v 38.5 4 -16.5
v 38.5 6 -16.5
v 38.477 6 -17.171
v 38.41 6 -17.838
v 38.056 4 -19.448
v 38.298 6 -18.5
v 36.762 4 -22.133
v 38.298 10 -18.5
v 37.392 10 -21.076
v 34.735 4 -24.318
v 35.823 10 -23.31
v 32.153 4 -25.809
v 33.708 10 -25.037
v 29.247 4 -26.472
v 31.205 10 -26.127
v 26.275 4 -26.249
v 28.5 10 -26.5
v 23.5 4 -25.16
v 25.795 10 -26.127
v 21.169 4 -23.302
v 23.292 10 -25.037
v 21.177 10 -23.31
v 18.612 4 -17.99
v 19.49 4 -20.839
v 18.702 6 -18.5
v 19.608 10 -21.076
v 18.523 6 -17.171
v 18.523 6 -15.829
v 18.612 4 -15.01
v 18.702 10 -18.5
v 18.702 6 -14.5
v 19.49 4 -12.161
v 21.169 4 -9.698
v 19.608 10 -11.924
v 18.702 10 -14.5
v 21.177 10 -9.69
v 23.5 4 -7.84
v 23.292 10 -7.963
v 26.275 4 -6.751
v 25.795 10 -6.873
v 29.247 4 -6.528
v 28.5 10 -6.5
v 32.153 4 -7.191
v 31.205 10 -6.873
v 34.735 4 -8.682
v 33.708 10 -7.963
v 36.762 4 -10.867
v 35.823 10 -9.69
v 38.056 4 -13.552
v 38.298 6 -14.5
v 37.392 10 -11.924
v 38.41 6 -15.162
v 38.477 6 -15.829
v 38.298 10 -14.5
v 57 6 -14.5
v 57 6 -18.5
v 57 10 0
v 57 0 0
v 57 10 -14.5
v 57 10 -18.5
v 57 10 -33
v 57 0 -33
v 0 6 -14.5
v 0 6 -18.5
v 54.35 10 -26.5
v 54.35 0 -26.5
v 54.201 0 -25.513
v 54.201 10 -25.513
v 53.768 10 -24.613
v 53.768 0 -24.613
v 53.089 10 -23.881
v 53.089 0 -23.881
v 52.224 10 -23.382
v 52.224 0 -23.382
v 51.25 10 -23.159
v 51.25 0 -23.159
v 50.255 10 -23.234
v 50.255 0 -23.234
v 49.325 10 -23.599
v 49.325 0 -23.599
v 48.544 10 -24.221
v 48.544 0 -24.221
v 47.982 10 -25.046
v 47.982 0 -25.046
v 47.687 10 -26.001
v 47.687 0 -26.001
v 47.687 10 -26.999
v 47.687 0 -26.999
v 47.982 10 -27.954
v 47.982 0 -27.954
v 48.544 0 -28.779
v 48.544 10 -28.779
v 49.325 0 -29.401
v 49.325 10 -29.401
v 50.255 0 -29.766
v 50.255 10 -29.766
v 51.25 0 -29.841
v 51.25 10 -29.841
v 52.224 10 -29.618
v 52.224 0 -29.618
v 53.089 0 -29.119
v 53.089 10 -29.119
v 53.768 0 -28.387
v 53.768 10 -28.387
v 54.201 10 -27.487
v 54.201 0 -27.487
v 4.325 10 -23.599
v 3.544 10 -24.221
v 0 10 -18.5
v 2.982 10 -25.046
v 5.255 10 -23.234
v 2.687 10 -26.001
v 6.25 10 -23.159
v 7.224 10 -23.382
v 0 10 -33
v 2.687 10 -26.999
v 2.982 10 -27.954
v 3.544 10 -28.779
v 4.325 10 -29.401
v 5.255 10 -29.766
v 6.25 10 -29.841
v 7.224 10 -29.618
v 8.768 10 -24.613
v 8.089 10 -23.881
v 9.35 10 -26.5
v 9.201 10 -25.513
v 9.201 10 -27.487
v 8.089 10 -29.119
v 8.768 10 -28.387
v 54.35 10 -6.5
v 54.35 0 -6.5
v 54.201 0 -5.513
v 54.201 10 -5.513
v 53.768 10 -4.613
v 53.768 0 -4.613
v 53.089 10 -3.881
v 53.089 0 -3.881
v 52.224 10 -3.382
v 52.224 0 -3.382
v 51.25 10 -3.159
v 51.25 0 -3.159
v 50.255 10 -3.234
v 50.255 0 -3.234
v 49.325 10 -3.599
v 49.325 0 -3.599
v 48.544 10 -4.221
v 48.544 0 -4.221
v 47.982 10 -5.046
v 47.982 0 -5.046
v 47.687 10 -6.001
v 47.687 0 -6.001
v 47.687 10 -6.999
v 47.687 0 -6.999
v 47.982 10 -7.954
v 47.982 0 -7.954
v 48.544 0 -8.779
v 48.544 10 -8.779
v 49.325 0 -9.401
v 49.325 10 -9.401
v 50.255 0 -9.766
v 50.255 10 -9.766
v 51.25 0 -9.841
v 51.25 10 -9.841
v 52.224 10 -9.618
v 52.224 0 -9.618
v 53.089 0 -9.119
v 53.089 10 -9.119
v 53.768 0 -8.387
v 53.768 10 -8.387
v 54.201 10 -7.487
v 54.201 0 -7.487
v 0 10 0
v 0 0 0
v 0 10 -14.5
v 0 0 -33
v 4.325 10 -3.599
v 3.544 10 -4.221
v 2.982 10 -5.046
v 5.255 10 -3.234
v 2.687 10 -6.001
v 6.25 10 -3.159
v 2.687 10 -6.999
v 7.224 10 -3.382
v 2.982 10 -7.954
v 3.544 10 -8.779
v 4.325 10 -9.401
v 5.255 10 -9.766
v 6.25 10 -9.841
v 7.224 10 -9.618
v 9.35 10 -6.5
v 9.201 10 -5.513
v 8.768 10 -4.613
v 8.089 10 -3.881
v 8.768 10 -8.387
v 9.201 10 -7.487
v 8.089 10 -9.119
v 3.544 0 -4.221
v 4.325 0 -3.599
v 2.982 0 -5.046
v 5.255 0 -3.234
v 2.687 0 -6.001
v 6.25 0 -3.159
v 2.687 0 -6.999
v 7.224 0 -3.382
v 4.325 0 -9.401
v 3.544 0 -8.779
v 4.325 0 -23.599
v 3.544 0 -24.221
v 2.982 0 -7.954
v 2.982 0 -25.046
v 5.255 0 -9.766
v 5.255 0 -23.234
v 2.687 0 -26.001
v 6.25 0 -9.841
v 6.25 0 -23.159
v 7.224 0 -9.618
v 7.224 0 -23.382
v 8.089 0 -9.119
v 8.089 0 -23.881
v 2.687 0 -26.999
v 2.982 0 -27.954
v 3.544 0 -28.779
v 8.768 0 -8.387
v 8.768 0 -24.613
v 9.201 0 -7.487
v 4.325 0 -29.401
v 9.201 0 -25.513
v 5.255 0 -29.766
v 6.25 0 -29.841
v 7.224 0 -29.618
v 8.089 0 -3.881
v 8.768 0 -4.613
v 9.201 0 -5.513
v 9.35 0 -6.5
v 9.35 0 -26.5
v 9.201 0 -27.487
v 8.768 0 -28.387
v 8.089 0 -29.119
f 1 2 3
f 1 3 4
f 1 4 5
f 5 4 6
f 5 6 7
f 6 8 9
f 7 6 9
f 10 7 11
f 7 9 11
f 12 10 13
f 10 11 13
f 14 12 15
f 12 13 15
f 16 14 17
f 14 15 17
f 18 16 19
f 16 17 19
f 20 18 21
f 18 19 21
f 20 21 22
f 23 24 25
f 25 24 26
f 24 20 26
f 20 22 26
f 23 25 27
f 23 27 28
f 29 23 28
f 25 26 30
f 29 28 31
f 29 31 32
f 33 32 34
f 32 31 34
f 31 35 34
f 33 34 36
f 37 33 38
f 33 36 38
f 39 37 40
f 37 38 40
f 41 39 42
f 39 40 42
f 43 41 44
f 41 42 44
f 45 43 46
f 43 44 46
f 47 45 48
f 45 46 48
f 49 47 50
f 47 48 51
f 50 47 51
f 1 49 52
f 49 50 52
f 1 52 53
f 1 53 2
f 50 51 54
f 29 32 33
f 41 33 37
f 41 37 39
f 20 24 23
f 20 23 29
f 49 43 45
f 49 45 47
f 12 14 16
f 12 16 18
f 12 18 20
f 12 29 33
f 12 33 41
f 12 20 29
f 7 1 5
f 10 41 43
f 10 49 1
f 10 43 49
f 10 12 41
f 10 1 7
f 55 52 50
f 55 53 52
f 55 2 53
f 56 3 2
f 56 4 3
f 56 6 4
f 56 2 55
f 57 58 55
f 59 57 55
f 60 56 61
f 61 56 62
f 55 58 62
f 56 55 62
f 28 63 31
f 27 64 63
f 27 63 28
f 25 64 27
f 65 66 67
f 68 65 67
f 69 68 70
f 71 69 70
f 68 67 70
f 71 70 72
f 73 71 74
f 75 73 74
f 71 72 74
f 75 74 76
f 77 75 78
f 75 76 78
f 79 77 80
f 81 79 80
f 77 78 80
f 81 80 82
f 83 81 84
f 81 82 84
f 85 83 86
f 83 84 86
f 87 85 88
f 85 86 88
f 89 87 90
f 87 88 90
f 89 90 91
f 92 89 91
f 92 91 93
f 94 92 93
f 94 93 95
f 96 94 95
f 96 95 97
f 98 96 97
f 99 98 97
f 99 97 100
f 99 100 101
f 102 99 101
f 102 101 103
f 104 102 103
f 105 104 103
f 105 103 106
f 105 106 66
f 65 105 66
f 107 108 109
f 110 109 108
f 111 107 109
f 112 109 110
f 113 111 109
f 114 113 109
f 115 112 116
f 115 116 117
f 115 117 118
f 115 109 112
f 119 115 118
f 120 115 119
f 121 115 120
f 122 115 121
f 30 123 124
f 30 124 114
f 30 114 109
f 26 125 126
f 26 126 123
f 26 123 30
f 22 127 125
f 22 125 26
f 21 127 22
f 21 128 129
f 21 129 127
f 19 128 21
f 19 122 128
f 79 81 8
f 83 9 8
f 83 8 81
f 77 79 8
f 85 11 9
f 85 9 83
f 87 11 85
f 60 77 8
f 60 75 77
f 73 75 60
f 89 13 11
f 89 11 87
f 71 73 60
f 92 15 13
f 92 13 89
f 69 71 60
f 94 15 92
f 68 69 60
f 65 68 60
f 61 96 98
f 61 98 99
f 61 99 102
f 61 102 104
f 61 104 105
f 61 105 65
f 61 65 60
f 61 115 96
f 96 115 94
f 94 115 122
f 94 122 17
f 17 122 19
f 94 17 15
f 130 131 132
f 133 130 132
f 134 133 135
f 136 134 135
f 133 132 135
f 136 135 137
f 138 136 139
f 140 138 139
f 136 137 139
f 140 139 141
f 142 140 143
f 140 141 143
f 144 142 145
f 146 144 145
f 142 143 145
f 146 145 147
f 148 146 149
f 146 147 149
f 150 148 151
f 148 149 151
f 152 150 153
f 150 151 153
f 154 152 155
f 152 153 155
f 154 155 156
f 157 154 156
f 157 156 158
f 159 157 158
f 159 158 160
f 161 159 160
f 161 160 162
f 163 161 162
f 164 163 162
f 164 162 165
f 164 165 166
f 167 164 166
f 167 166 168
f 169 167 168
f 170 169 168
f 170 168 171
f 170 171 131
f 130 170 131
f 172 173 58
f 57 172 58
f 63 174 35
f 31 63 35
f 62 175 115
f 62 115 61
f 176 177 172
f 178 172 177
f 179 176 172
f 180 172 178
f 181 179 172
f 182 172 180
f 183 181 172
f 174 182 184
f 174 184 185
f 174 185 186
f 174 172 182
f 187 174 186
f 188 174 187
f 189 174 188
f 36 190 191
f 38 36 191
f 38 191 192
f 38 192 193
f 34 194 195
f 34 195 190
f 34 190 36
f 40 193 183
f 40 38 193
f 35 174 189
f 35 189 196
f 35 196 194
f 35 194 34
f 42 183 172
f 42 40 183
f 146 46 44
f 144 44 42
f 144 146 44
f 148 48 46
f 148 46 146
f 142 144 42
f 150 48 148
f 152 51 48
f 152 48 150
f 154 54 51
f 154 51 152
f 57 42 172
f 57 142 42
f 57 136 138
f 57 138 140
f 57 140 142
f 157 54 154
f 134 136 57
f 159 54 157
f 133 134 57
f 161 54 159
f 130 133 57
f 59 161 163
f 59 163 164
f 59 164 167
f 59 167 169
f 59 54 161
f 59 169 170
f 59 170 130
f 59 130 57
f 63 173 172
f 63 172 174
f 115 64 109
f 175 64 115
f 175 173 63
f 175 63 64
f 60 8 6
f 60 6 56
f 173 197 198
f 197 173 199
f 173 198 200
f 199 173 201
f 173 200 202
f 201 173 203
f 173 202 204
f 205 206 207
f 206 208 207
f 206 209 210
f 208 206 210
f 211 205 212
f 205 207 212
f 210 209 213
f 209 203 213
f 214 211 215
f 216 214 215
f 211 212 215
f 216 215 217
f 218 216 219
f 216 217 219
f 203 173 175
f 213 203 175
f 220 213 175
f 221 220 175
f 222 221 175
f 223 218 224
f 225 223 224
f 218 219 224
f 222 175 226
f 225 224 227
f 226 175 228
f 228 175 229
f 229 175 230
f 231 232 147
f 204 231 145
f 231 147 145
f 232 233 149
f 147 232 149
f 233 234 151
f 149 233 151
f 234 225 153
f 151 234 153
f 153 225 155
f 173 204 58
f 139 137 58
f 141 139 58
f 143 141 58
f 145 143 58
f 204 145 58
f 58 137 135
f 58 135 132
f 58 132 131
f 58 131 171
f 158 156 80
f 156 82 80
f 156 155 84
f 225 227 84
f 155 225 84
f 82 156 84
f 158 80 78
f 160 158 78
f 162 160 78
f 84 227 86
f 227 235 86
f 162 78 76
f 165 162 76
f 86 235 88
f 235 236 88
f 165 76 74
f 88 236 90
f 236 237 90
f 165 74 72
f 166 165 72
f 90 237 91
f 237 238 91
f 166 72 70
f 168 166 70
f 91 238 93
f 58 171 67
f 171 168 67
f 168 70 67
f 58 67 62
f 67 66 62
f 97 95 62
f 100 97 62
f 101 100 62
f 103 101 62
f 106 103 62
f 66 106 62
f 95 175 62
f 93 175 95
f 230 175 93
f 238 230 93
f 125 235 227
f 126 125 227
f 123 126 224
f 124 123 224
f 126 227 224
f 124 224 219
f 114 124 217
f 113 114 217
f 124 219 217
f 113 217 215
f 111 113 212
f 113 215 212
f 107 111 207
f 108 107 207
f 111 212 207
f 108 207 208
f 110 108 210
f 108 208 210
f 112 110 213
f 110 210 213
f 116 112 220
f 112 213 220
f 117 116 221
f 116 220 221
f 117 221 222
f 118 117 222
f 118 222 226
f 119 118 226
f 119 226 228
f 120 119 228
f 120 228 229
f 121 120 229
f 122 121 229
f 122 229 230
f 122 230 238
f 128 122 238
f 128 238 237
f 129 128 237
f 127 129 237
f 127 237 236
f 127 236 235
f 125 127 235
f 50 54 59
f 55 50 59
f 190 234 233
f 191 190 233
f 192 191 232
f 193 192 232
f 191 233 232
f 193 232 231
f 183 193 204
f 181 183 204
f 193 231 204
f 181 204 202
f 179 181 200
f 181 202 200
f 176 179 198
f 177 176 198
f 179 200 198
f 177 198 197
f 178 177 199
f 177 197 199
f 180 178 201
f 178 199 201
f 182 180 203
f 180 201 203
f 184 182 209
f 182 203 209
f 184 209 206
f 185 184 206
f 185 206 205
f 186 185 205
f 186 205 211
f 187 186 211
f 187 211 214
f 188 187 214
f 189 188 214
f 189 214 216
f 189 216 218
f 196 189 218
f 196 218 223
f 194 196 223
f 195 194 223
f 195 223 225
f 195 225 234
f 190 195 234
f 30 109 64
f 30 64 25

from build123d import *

# Parameters (mm, degrees)
SKETCH1_W           = 57
SKETCH1_H           = 33
BOSS_EXTRUDE1_DEPTH = 10
SKETCH3_R           = 3.35
CUT_EXTRUDE1_DEPTH  = 11
SKETCH4_R           = 3.35
CUT_EXTRUDE2_DEPTH  = 11
SKETCH10_R          = 3.35
CUT_EXTRUDE5_DEPTH  = 11
SKETCH12_R          = 3.35
CUT_EXTRUDE6_DEPTH  = 11
SKETCH16_W          = 57
SKETCH16_H          = 4
CUT_EXTRUDE7_DEPTH  = 4
SKETCH17_R          = 10
CUT_EXTRUDE8_DEPTH  = 6


with BuildPart() as part:
    # Sketch1 → Boss-Extrude1 (new body)
    with BuildSketch(Plane(origin=(0, 0, 0), x_dir=(1, 0, 0), z_dir=(0, 1, 0))):
        with Locations((28.5, 16.5)):
            Rectangle(SKETCH1_W, SKETCH1_H)
    extrude(amount=BOSS_EXTRUDE1_DEPTH)

    # Sketch3 → Cut-Extrude1 (cut, through all)
    with BuildSketch(Plane.XZ):
        with Locations((6, -6.5)):
            Circle(SKETCH3_R)
    extrude(amount=-CUT_EXTRUDE1_DEPTH, mode=Mode.SUBTRACT)

    # Sketch4 → Cut-Extrude2 (cut, through all)
    with BuildSketch(Plane.XZ):
        with Locations((51, -26.5)):
            Circle(SKETCH4_R)
    extrude(amount=-CUT_EXTRUDE2_DEPTH, mode=Mode.SUBTRACT)

    # Sketch10 → Cut-Extrude5 (cut, through all)
    with BuildSketch(Plane.XZ):
        with Locations((6, -26.5)):
            Circle(SKETCH10_R)
    extrude(amount=-CUT_EXTRUDE5_DEPTH, mode=Mode.SUBTRACT)

    # Sketch12 → Cut-Extrude6 (cut, through all)
    with BuildSketch(Plane.XZ):
        with Locations((51, -6.5)):
            Circle(SKETCH12_R)
    extrude(amount=-CUT_EXTRUDE6_DEPTH, mode=Mode.SUBTRACT)

    # Sketch16 → Cut-Extrude7 (cut)
    with BuildSketch(Plane(origin=(0, 10, 0), x_dir=(1, 0, 0), z_dir=(0, 1, 0))):
        with Locations((28.5, 16.5)):
            Rectangle(SKETCH16_W, SKETCH16_H)
    extrude(amount=-CUT_EXTRUDE7_DEPTH, mode=Mode.SUBTRACT)

    # Sketch17 → Cut-Extrude8 (cut)
    with BuildSketch(Plane(origin=(0, 10, 0), x_dir=(1, 0, 0), z_dir=(0, 1, 0))):
        with Locations((28.5, 16.5)):
            Circle(SKETCH17_R)
    extrude(amount=-CUT_EXTRUDE8_DEPTH, mode=Mode.SUBTRACT)


solid = part.part
